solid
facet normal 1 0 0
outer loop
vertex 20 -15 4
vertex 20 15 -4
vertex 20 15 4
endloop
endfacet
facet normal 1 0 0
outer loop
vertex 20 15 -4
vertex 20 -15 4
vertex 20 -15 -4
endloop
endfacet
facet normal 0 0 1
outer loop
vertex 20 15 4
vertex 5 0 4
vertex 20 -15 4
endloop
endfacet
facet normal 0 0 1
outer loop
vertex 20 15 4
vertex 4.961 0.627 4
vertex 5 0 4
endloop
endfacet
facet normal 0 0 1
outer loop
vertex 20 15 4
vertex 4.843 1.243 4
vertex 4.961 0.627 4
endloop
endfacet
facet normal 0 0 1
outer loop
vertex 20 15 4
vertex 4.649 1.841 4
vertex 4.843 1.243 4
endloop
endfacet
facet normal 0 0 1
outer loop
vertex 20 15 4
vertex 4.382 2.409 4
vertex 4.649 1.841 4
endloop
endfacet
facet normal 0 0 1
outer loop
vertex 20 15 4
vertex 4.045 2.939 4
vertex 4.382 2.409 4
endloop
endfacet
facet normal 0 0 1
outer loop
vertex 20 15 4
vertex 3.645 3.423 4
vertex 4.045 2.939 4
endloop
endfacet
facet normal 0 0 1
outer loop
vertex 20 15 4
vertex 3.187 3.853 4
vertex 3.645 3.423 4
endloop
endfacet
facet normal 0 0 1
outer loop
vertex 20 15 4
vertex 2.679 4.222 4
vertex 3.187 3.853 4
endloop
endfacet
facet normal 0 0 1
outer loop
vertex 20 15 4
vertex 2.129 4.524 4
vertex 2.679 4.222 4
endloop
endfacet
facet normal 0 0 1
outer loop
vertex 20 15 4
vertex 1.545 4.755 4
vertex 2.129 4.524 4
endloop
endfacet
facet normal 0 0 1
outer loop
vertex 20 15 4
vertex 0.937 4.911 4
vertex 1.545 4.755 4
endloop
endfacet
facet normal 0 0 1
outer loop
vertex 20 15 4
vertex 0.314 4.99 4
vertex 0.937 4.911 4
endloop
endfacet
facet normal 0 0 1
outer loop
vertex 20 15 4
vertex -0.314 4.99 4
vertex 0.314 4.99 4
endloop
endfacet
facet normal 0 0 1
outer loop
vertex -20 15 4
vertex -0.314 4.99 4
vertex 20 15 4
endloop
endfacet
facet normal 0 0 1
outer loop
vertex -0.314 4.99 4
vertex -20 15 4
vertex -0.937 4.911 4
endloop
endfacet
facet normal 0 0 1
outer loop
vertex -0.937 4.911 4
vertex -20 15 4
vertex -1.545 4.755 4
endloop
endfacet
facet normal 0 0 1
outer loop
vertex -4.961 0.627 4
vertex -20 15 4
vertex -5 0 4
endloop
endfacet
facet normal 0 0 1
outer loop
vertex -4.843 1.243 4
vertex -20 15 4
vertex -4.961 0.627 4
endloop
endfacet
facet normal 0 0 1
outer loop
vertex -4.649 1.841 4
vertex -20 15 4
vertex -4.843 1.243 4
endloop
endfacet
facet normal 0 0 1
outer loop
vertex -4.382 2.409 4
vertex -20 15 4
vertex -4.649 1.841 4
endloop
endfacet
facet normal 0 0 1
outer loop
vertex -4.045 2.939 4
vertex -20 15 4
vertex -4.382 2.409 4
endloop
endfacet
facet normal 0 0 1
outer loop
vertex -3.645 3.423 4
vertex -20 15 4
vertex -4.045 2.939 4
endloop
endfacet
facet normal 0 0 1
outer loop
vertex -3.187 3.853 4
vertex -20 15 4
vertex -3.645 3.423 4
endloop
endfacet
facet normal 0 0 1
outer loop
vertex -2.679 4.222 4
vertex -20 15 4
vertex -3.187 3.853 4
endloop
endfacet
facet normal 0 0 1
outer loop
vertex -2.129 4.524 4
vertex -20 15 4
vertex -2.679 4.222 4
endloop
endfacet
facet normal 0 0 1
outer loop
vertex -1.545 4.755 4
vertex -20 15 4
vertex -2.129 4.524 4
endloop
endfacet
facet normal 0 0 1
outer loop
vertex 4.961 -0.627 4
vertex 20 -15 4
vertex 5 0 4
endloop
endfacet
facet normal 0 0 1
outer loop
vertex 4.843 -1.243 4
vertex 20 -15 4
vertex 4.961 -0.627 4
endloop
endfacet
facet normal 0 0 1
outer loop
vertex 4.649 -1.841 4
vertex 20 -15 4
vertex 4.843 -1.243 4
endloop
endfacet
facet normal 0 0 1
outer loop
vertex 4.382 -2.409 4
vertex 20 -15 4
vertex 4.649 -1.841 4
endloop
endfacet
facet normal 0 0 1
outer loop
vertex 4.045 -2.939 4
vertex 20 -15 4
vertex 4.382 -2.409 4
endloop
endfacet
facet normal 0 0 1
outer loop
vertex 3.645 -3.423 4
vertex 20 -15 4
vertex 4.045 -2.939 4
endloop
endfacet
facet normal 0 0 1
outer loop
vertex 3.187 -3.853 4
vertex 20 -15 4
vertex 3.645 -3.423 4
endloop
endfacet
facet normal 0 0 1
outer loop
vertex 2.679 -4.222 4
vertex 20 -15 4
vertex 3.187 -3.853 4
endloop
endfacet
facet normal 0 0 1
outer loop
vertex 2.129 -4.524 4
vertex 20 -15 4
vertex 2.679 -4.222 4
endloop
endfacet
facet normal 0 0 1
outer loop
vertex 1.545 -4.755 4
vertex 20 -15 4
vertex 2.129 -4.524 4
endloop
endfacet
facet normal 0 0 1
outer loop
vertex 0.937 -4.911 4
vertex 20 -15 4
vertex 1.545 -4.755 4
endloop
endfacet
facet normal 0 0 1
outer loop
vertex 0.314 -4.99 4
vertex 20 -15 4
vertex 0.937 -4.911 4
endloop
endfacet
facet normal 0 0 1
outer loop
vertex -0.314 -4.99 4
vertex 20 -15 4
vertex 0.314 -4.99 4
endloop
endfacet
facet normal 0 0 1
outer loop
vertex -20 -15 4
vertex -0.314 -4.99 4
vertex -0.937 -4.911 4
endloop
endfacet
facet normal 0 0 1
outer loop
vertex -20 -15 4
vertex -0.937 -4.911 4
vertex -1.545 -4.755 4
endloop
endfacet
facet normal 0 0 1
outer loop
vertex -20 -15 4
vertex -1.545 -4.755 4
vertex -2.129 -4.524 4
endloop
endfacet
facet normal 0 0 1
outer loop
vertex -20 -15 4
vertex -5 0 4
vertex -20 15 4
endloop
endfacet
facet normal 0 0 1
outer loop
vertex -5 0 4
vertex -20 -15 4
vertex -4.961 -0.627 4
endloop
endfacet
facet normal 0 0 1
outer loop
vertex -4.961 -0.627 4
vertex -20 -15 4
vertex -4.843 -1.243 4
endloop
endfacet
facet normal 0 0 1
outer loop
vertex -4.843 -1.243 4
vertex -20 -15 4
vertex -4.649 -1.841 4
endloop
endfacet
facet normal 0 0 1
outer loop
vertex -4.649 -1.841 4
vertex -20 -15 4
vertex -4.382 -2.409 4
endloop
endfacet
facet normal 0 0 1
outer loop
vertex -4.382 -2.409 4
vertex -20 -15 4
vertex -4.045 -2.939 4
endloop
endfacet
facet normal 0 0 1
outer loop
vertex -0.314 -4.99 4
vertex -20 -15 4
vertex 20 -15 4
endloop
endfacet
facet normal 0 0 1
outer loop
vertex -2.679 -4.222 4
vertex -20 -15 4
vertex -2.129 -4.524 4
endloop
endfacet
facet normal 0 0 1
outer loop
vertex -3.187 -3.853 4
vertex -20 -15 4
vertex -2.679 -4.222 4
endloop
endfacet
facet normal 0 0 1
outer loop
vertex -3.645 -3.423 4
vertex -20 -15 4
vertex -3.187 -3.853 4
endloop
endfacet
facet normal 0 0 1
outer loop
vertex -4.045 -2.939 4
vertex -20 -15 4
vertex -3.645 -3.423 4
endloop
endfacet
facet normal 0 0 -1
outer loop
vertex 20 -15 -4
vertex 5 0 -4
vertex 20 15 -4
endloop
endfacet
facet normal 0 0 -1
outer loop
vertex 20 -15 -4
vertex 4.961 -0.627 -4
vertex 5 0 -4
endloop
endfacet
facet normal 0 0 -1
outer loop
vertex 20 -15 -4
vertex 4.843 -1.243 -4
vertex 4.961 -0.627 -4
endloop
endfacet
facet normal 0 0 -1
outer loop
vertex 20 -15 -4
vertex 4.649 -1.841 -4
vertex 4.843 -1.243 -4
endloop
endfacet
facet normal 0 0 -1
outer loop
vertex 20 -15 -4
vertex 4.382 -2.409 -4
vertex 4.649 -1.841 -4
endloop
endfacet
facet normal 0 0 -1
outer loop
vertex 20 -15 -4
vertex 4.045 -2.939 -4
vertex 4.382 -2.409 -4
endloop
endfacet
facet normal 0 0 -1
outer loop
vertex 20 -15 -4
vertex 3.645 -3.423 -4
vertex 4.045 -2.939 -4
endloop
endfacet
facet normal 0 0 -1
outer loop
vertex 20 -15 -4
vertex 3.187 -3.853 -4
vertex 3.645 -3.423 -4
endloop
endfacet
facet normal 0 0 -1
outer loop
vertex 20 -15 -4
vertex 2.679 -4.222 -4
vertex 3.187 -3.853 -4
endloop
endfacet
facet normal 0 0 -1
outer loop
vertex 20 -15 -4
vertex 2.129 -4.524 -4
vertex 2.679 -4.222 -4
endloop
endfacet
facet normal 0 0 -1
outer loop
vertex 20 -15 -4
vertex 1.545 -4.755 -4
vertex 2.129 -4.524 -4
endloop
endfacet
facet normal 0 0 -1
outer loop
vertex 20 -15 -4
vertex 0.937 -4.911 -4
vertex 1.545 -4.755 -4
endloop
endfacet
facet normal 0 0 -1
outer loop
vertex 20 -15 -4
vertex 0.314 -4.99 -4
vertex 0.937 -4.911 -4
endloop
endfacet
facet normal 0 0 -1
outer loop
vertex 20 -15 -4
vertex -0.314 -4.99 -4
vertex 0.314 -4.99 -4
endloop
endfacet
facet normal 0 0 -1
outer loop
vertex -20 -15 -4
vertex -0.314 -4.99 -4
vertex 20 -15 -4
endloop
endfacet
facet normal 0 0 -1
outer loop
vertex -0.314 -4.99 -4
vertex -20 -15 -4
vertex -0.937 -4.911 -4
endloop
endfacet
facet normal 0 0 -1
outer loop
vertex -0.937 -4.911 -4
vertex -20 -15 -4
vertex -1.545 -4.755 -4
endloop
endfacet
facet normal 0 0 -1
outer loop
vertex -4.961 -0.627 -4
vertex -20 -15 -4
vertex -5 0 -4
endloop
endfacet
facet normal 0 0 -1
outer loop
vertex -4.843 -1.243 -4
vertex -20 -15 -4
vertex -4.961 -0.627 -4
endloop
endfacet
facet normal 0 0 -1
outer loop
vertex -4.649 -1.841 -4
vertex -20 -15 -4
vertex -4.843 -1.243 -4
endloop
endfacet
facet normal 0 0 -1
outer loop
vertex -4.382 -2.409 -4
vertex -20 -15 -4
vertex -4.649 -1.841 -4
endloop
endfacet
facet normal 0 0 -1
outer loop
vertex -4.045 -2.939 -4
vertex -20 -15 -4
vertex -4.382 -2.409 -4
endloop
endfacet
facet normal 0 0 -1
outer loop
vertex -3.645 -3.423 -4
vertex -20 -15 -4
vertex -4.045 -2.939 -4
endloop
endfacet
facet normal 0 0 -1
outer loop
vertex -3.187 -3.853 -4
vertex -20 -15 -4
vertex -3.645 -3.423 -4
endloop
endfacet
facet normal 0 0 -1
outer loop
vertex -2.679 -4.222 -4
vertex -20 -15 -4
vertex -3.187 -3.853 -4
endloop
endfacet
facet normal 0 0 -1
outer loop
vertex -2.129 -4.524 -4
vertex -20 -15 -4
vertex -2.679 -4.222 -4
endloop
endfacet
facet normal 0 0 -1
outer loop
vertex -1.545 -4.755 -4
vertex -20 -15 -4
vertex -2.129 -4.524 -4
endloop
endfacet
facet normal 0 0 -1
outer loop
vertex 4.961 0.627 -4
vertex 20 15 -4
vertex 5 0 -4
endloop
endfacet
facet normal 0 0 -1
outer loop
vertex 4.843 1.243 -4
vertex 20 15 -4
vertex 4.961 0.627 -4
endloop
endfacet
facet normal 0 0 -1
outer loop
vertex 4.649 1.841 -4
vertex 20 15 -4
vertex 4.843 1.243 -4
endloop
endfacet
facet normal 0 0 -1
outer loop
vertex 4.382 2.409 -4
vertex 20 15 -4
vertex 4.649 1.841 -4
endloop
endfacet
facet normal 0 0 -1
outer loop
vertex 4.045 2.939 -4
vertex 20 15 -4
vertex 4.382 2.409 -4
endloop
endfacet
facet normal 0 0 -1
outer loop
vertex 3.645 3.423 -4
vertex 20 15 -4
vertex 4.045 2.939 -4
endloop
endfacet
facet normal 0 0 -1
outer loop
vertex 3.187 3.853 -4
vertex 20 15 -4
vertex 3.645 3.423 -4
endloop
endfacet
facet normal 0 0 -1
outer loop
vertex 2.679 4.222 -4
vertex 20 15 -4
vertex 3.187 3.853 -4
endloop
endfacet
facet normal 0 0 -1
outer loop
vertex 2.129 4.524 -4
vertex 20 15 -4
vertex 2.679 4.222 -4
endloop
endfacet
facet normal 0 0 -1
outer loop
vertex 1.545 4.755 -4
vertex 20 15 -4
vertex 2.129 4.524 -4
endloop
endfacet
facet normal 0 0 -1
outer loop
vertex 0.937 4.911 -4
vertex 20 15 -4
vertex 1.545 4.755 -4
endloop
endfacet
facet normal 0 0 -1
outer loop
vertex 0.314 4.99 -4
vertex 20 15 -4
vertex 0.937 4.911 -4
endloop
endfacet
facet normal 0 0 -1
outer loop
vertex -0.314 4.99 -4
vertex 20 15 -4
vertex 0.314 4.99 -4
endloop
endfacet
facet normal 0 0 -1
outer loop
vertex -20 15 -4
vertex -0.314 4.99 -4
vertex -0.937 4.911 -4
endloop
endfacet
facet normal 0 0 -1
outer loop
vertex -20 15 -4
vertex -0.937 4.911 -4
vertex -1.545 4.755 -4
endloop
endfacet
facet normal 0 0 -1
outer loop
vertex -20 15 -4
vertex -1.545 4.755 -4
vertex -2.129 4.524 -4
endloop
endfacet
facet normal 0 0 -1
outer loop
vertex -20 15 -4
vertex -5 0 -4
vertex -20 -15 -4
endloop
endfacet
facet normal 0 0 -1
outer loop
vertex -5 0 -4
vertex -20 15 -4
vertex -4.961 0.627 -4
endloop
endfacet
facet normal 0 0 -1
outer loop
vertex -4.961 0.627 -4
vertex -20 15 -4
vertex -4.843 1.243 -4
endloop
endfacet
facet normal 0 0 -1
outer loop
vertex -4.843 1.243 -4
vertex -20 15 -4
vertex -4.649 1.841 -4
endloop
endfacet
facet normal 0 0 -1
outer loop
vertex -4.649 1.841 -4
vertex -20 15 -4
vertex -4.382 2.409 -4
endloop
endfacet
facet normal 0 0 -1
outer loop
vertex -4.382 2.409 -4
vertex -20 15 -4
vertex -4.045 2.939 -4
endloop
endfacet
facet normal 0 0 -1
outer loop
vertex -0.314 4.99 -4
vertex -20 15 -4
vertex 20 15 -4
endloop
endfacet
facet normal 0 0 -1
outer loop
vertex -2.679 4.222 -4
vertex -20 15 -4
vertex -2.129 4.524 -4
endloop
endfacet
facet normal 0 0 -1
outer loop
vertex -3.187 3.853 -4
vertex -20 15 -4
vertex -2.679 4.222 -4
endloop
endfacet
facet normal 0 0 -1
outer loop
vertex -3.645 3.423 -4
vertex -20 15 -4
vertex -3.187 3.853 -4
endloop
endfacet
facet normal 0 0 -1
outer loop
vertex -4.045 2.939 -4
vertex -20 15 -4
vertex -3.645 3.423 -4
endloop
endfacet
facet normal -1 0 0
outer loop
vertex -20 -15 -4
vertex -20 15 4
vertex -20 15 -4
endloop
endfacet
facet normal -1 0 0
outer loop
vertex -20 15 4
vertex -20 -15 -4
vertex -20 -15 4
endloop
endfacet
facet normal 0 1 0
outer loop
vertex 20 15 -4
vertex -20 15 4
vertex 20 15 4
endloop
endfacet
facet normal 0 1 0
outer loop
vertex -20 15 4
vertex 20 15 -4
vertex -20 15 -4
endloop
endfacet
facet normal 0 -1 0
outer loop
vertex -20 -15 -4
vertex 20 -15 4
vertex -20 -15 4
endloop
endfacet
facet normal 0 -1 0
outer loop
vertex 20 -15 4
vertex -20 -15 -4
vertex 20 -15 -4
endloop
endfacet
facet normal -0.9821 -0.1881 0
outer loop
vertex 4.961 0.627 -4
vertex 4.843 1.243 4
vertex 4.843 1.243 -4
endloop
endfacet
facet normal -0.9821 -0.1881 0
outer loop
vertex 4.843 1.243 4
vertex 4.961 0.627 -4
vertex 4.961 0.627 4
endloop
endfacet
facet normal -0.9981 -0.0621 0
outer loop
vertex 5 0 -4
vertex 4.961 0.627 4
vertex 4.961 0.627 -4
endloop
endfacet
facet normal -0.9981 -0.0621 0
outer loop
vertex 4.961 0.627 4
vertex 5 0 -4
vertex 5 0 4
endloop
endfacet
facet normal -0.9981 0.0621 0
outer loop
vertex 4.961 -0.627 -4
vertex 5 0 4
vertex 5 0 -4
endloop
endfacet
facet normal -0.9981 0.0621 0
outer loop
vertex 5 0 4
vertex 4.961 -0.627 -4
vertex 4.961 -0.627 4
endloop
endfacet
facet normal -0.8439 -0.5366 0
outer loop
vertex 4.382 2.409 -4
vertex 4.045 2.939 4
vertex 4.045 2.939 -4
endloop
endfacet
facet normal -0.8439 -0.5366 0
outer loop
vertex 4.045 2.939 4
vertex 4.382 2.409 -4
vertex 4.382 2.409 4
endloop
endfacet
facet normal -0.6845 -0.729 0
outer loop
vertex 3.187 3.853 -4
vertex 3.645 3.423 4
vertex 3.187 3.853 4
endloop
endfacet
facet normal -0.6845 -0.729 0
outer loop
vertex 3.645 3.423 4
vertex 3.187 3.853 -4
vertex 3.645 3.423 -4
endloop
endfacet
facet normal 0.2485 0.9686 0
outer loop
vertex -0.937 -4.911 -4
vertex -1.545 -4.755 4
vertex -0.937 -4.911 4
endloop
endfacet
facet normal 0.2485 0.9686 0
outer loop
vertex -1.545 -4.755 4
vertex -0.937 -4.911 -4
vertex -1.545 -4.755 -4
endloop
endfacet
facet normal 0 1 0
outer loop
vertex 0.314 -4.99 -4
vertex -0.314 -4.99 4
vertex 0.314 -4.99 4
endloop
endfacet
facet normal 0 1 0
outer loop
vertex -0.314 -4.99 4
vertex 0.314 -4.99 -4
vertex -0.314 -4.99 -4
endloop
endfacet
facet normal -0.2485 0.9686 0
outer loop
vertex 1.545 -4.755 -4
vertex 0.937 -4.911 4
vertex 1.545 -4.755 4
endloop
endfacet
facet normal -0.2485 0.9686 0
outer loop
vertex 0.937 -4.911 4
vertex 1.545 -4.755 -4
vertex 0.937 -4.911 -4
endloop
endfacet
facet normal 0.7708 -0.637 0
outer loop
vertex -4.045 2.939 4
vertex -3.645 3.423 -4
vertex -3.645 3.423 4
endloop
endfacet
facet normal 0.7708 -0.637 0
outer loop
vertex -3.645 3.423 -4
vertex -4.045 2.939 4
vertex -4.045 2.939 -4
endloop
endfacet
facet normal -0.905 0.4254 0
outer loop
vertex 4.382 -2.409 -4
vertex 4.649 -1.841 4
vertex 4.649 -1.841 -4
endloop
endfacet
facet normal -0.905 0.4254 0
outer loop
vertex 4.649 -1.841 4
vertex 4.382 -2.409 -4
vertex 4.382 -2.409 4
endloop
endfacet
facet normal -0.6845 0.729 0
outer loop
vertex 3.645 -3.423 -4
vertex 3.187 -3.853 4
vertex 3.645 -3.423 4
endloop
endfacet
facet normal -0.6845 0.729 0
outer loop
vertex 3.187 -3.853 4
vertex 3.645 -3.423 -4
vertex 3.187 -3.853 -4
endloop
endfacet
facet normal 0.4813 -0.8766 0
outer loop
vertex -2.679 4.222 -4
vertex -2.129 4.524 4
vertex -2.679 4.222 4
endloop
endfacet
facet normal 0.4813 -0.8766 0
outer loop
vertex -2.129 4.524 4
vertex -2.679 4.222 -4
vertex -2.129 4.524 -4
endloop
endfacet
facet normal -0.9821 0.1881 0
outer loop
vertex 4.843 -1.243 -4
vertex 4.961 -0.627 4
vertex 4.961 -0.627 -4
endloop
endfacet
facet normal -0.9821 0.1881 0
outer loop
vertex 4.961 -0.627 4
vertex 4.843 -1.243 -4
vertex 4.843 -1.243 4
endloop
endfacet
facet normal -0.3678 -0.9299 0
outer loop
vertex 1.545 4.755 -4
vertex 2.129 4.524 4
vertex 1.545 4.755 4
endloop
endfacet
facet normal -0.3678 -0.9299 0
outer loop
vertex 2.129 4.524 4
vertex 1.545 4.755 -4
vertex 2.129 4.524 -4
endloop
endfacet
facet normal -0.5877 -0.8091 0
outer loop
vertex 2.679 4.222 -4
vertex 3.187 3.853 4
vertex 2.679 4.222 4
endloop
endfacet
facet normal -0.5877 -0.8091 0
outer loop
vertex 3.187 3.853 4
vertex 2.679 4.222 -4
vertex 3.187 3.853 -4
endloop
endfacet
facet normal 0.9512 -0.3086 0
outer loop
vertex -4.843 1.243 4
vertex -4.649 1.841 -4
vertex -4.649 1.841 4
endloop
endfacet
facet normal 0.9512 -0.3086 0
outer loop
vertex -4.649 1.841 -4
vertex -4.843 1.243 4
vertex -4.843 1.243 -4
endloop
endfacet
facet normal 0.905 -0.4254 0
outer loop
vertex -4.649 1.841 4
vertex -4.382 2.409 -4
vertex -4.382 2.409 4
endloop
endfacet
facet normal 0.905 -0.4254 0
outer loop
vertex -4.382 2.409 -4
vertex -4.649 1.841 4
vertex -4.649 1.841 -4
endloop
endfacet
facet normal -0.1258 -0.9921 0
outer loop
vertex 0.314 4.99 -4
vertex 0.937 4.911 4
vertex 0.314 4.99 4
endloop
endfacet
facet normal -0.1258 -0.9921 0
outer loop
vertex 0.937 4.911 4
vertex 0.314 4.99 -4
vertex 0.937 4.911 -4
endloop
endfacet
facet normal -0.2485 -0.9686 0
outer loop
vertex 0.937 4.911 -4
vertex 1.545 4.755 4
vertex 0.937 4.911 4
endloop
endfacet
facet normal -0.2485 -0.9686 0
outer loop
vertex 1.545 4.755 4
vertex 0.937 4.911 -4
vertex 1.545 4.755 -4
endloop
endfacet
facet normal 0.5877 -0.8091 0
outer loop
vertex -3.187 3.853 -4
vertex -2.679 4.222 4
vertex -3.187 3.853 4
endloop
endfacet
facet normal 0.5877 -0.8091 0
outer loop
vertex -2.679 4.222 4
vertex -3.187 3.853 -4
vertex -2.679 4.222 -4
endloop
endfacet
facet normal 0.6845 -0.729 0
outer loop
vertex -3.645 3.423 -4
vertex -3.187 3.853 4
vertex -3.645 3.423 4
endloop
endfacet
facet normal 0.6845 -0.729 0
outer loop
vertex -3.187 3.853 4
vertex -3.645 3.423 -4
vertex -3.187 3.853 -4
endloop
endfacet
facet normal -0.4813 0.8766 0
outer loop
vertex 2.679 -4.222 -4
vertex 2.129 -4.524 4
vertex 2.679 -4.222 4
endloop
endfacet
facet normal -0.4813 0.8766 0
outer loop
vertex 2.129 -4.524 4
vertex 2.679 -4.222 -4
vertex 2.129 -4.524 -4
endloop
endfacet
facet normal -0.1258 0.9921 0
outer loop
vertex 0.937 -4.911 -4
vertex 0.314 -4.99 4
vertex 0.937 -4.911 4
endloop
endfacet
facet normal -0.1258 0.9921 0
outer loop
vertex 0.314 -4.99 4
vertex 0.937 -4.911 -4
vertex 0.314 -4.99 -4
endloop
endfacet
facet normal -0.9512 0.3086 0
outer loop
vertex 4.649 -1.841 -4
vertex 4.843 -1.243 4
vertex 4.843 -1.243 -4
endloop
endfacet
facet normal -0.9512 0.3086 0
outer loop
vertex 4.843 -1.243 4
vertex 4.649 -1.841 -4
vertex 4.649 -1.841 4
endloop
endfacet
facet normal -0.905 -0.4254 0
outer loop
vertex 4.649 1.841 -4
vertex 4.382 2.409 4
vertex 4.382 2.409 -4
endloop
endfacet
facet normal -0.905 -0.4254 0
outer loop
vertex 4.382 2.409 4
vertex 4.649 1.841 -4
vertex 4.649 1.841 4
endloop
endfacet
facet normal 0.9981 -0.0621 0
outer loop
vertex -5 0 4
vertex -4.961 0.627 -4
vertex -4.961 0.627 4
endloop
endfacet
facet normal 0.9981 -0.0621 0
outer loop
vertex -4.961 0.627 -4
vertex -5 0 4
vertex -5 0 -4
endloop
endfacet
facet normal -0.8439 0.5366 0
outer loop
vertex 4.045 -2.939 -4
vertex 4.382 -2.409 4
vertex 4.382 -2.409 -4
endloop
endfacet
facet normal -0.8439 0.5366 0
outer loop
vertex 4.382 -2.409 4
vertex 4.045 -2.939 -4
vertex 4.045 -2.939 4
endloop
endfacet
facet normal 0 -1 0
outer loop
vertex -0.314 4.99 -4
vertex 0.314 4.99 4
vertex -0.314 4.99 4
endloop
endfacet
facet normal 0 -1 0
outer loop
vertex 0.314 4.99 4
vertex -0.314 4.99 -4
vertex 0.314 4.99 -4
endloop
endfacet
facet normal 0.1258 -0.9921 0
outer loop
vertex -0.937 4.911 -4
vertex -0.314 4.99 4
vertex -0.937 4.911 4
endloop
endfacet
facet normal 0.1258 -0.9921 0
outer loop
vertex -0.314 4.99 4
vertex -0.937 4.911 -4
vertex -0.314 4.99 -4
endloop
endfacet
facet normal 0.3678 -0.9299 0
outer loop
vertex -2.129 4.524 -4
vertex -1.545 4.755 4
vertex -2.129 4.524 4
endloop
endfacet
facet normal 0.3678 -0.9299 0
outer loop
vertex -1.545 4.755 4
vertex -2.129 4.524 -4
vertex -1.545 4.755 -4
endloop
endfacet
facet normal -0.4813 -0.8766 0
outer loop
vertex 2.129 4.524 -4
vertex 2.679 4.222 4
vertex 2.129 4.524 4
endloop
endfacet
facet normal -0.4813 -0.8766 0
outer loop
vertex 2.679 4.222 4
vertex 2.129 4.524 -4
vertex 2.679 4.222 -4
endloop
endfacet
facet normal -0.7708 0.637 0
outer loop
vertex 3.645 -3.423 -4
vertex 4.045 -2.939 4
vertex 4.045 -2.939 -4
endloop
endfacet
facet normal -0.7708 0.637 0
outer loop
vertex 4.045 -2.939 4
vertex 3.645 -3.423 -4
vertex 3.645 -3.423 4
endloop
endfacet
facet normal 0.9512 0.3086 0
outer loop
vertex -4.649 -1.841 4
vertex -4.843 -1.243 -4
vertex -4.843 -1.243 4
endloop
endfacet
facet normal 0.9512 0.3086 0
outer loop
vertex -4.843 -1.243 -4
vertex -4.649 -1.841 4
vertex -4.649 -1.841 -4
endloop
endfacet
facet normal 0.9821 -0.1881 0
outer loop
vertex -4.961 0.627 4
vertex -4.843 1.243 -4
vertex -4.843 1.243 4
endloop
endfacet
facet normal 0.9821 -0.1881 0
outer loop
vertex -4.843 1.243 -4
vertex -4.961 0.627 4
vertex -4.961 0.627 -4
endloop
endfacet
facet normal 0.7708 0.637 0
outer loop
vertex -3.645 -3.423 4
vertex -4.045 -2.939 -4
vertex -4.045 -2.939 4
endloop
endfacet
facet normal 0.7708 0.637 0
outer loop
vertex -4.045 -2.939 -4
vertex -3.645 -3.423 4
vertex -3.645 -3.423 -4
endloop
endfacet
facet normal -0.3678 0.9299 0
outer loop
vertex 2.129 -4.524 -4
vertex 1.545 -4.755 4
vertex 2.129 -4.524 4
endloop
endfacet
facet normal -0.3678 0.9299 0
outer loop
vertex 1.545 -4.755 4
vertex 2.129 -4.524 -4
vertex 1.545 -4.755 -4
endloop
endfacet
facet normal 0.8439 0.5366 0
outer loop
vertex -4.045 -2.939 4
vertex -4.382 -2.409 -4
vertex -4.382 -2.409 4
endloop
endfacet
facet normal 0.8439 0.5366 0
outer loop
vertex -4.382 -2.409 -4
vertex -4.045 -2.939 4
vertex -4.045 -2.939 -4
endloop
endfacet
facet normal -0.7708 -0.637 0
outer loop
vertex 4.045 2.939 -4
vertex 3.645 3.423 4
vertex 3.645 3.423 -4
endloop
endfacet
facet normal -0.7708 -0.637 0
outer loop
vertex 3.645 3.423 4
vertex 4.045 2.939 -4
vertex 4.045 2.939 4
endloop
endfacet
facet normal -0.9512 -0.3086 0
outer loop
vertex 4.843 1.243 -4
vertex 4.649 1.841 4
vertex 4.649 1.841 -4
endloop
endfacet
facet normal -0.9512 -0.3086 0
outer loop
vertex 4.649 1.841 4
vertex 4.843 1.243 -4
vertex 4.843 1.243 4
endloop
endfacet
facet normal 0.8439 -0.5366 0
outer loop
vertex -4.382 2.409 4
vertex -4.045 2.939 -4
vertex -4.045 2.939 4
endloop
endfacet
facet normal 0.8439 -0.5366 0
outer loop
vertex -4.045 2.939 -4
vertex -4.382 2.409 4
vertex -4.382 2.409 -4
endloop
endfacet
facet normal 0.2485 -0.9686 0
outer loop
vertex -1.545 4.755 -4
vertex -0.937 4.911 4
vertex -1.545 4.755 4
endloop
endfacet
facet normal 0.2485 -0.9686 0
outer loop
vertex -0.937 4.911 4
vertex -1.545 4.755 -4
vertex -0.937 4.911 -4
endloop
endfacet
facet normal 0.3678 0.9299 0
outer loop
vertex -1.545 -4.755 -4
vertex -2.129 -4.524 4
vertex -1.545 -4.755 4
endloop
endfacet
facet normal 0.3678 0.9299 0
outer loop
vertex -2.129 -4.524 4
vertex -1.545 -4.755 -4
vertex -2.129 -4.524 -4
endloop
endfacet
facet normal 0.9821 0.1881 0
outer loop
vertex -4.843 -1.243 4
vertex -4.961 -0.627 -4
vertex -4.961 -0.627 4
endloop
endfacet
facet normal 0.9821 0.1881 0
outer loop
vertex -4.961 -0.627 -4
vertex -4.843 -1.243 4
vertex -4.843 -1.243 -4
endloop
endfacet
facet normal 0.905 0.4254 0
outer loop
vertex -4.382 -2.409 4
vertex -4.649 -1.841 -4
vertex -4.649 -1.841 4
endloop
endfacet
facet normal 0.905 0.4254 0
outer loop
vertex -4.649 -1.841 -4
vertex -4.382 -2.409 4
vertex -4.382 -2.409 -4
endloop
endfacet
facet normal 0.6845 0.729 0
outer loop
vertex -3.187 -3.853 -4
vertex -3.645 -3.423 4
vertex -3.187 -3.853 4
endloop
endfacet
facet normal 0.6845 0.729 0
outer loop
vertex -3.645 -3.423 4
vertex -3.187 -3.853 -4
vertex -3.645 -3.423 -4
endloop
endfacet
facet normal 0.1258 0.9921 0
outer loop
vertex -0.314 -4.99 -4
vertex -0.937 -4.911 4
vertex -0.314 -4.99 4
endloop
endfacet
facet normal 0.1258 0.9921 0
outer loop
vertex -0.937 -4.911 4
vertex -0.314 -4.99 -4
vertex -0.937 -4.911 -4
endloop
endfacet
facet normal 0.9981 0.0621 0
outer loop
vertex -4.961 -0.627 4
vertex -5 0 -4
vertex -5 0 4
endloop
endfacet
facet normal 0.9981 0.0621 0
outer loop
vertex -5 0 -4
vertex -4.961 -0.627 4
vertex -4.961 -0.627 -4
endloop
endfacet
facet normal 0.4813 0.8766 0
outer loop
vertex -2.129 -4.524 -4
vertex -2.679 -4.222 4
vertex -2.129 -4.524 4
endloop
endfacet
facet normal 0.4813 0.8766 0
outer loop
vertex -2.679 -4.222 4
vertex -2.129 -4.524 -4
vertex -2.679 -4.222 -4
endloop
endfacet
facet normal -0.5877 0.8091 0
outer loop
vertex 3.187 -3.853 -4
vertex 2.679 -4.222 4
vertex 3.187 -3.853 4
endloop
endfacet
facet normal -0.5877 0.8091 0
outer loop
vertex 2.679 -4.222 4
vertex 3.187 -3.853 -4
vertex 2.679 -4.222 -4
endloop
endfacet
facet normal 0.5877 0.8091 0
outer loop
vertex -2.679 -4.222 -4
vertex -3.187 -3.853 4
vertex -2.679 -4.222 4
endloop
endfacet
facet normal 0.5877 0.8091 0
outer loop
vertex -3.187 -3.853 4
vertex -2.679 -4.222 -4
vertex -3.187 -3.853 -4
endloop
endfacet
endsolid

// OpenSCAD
// 40 mm long, 30 mm wide, 8 mm thick plate with 10 mm diameter hole
difference() {
    // Main plate
    cube([40, 30, 8], center = true);
    
    // Cylindrical hole along Z axis
    cylinder(h = 10, d = 10, center = true, $fn = 50);
}
